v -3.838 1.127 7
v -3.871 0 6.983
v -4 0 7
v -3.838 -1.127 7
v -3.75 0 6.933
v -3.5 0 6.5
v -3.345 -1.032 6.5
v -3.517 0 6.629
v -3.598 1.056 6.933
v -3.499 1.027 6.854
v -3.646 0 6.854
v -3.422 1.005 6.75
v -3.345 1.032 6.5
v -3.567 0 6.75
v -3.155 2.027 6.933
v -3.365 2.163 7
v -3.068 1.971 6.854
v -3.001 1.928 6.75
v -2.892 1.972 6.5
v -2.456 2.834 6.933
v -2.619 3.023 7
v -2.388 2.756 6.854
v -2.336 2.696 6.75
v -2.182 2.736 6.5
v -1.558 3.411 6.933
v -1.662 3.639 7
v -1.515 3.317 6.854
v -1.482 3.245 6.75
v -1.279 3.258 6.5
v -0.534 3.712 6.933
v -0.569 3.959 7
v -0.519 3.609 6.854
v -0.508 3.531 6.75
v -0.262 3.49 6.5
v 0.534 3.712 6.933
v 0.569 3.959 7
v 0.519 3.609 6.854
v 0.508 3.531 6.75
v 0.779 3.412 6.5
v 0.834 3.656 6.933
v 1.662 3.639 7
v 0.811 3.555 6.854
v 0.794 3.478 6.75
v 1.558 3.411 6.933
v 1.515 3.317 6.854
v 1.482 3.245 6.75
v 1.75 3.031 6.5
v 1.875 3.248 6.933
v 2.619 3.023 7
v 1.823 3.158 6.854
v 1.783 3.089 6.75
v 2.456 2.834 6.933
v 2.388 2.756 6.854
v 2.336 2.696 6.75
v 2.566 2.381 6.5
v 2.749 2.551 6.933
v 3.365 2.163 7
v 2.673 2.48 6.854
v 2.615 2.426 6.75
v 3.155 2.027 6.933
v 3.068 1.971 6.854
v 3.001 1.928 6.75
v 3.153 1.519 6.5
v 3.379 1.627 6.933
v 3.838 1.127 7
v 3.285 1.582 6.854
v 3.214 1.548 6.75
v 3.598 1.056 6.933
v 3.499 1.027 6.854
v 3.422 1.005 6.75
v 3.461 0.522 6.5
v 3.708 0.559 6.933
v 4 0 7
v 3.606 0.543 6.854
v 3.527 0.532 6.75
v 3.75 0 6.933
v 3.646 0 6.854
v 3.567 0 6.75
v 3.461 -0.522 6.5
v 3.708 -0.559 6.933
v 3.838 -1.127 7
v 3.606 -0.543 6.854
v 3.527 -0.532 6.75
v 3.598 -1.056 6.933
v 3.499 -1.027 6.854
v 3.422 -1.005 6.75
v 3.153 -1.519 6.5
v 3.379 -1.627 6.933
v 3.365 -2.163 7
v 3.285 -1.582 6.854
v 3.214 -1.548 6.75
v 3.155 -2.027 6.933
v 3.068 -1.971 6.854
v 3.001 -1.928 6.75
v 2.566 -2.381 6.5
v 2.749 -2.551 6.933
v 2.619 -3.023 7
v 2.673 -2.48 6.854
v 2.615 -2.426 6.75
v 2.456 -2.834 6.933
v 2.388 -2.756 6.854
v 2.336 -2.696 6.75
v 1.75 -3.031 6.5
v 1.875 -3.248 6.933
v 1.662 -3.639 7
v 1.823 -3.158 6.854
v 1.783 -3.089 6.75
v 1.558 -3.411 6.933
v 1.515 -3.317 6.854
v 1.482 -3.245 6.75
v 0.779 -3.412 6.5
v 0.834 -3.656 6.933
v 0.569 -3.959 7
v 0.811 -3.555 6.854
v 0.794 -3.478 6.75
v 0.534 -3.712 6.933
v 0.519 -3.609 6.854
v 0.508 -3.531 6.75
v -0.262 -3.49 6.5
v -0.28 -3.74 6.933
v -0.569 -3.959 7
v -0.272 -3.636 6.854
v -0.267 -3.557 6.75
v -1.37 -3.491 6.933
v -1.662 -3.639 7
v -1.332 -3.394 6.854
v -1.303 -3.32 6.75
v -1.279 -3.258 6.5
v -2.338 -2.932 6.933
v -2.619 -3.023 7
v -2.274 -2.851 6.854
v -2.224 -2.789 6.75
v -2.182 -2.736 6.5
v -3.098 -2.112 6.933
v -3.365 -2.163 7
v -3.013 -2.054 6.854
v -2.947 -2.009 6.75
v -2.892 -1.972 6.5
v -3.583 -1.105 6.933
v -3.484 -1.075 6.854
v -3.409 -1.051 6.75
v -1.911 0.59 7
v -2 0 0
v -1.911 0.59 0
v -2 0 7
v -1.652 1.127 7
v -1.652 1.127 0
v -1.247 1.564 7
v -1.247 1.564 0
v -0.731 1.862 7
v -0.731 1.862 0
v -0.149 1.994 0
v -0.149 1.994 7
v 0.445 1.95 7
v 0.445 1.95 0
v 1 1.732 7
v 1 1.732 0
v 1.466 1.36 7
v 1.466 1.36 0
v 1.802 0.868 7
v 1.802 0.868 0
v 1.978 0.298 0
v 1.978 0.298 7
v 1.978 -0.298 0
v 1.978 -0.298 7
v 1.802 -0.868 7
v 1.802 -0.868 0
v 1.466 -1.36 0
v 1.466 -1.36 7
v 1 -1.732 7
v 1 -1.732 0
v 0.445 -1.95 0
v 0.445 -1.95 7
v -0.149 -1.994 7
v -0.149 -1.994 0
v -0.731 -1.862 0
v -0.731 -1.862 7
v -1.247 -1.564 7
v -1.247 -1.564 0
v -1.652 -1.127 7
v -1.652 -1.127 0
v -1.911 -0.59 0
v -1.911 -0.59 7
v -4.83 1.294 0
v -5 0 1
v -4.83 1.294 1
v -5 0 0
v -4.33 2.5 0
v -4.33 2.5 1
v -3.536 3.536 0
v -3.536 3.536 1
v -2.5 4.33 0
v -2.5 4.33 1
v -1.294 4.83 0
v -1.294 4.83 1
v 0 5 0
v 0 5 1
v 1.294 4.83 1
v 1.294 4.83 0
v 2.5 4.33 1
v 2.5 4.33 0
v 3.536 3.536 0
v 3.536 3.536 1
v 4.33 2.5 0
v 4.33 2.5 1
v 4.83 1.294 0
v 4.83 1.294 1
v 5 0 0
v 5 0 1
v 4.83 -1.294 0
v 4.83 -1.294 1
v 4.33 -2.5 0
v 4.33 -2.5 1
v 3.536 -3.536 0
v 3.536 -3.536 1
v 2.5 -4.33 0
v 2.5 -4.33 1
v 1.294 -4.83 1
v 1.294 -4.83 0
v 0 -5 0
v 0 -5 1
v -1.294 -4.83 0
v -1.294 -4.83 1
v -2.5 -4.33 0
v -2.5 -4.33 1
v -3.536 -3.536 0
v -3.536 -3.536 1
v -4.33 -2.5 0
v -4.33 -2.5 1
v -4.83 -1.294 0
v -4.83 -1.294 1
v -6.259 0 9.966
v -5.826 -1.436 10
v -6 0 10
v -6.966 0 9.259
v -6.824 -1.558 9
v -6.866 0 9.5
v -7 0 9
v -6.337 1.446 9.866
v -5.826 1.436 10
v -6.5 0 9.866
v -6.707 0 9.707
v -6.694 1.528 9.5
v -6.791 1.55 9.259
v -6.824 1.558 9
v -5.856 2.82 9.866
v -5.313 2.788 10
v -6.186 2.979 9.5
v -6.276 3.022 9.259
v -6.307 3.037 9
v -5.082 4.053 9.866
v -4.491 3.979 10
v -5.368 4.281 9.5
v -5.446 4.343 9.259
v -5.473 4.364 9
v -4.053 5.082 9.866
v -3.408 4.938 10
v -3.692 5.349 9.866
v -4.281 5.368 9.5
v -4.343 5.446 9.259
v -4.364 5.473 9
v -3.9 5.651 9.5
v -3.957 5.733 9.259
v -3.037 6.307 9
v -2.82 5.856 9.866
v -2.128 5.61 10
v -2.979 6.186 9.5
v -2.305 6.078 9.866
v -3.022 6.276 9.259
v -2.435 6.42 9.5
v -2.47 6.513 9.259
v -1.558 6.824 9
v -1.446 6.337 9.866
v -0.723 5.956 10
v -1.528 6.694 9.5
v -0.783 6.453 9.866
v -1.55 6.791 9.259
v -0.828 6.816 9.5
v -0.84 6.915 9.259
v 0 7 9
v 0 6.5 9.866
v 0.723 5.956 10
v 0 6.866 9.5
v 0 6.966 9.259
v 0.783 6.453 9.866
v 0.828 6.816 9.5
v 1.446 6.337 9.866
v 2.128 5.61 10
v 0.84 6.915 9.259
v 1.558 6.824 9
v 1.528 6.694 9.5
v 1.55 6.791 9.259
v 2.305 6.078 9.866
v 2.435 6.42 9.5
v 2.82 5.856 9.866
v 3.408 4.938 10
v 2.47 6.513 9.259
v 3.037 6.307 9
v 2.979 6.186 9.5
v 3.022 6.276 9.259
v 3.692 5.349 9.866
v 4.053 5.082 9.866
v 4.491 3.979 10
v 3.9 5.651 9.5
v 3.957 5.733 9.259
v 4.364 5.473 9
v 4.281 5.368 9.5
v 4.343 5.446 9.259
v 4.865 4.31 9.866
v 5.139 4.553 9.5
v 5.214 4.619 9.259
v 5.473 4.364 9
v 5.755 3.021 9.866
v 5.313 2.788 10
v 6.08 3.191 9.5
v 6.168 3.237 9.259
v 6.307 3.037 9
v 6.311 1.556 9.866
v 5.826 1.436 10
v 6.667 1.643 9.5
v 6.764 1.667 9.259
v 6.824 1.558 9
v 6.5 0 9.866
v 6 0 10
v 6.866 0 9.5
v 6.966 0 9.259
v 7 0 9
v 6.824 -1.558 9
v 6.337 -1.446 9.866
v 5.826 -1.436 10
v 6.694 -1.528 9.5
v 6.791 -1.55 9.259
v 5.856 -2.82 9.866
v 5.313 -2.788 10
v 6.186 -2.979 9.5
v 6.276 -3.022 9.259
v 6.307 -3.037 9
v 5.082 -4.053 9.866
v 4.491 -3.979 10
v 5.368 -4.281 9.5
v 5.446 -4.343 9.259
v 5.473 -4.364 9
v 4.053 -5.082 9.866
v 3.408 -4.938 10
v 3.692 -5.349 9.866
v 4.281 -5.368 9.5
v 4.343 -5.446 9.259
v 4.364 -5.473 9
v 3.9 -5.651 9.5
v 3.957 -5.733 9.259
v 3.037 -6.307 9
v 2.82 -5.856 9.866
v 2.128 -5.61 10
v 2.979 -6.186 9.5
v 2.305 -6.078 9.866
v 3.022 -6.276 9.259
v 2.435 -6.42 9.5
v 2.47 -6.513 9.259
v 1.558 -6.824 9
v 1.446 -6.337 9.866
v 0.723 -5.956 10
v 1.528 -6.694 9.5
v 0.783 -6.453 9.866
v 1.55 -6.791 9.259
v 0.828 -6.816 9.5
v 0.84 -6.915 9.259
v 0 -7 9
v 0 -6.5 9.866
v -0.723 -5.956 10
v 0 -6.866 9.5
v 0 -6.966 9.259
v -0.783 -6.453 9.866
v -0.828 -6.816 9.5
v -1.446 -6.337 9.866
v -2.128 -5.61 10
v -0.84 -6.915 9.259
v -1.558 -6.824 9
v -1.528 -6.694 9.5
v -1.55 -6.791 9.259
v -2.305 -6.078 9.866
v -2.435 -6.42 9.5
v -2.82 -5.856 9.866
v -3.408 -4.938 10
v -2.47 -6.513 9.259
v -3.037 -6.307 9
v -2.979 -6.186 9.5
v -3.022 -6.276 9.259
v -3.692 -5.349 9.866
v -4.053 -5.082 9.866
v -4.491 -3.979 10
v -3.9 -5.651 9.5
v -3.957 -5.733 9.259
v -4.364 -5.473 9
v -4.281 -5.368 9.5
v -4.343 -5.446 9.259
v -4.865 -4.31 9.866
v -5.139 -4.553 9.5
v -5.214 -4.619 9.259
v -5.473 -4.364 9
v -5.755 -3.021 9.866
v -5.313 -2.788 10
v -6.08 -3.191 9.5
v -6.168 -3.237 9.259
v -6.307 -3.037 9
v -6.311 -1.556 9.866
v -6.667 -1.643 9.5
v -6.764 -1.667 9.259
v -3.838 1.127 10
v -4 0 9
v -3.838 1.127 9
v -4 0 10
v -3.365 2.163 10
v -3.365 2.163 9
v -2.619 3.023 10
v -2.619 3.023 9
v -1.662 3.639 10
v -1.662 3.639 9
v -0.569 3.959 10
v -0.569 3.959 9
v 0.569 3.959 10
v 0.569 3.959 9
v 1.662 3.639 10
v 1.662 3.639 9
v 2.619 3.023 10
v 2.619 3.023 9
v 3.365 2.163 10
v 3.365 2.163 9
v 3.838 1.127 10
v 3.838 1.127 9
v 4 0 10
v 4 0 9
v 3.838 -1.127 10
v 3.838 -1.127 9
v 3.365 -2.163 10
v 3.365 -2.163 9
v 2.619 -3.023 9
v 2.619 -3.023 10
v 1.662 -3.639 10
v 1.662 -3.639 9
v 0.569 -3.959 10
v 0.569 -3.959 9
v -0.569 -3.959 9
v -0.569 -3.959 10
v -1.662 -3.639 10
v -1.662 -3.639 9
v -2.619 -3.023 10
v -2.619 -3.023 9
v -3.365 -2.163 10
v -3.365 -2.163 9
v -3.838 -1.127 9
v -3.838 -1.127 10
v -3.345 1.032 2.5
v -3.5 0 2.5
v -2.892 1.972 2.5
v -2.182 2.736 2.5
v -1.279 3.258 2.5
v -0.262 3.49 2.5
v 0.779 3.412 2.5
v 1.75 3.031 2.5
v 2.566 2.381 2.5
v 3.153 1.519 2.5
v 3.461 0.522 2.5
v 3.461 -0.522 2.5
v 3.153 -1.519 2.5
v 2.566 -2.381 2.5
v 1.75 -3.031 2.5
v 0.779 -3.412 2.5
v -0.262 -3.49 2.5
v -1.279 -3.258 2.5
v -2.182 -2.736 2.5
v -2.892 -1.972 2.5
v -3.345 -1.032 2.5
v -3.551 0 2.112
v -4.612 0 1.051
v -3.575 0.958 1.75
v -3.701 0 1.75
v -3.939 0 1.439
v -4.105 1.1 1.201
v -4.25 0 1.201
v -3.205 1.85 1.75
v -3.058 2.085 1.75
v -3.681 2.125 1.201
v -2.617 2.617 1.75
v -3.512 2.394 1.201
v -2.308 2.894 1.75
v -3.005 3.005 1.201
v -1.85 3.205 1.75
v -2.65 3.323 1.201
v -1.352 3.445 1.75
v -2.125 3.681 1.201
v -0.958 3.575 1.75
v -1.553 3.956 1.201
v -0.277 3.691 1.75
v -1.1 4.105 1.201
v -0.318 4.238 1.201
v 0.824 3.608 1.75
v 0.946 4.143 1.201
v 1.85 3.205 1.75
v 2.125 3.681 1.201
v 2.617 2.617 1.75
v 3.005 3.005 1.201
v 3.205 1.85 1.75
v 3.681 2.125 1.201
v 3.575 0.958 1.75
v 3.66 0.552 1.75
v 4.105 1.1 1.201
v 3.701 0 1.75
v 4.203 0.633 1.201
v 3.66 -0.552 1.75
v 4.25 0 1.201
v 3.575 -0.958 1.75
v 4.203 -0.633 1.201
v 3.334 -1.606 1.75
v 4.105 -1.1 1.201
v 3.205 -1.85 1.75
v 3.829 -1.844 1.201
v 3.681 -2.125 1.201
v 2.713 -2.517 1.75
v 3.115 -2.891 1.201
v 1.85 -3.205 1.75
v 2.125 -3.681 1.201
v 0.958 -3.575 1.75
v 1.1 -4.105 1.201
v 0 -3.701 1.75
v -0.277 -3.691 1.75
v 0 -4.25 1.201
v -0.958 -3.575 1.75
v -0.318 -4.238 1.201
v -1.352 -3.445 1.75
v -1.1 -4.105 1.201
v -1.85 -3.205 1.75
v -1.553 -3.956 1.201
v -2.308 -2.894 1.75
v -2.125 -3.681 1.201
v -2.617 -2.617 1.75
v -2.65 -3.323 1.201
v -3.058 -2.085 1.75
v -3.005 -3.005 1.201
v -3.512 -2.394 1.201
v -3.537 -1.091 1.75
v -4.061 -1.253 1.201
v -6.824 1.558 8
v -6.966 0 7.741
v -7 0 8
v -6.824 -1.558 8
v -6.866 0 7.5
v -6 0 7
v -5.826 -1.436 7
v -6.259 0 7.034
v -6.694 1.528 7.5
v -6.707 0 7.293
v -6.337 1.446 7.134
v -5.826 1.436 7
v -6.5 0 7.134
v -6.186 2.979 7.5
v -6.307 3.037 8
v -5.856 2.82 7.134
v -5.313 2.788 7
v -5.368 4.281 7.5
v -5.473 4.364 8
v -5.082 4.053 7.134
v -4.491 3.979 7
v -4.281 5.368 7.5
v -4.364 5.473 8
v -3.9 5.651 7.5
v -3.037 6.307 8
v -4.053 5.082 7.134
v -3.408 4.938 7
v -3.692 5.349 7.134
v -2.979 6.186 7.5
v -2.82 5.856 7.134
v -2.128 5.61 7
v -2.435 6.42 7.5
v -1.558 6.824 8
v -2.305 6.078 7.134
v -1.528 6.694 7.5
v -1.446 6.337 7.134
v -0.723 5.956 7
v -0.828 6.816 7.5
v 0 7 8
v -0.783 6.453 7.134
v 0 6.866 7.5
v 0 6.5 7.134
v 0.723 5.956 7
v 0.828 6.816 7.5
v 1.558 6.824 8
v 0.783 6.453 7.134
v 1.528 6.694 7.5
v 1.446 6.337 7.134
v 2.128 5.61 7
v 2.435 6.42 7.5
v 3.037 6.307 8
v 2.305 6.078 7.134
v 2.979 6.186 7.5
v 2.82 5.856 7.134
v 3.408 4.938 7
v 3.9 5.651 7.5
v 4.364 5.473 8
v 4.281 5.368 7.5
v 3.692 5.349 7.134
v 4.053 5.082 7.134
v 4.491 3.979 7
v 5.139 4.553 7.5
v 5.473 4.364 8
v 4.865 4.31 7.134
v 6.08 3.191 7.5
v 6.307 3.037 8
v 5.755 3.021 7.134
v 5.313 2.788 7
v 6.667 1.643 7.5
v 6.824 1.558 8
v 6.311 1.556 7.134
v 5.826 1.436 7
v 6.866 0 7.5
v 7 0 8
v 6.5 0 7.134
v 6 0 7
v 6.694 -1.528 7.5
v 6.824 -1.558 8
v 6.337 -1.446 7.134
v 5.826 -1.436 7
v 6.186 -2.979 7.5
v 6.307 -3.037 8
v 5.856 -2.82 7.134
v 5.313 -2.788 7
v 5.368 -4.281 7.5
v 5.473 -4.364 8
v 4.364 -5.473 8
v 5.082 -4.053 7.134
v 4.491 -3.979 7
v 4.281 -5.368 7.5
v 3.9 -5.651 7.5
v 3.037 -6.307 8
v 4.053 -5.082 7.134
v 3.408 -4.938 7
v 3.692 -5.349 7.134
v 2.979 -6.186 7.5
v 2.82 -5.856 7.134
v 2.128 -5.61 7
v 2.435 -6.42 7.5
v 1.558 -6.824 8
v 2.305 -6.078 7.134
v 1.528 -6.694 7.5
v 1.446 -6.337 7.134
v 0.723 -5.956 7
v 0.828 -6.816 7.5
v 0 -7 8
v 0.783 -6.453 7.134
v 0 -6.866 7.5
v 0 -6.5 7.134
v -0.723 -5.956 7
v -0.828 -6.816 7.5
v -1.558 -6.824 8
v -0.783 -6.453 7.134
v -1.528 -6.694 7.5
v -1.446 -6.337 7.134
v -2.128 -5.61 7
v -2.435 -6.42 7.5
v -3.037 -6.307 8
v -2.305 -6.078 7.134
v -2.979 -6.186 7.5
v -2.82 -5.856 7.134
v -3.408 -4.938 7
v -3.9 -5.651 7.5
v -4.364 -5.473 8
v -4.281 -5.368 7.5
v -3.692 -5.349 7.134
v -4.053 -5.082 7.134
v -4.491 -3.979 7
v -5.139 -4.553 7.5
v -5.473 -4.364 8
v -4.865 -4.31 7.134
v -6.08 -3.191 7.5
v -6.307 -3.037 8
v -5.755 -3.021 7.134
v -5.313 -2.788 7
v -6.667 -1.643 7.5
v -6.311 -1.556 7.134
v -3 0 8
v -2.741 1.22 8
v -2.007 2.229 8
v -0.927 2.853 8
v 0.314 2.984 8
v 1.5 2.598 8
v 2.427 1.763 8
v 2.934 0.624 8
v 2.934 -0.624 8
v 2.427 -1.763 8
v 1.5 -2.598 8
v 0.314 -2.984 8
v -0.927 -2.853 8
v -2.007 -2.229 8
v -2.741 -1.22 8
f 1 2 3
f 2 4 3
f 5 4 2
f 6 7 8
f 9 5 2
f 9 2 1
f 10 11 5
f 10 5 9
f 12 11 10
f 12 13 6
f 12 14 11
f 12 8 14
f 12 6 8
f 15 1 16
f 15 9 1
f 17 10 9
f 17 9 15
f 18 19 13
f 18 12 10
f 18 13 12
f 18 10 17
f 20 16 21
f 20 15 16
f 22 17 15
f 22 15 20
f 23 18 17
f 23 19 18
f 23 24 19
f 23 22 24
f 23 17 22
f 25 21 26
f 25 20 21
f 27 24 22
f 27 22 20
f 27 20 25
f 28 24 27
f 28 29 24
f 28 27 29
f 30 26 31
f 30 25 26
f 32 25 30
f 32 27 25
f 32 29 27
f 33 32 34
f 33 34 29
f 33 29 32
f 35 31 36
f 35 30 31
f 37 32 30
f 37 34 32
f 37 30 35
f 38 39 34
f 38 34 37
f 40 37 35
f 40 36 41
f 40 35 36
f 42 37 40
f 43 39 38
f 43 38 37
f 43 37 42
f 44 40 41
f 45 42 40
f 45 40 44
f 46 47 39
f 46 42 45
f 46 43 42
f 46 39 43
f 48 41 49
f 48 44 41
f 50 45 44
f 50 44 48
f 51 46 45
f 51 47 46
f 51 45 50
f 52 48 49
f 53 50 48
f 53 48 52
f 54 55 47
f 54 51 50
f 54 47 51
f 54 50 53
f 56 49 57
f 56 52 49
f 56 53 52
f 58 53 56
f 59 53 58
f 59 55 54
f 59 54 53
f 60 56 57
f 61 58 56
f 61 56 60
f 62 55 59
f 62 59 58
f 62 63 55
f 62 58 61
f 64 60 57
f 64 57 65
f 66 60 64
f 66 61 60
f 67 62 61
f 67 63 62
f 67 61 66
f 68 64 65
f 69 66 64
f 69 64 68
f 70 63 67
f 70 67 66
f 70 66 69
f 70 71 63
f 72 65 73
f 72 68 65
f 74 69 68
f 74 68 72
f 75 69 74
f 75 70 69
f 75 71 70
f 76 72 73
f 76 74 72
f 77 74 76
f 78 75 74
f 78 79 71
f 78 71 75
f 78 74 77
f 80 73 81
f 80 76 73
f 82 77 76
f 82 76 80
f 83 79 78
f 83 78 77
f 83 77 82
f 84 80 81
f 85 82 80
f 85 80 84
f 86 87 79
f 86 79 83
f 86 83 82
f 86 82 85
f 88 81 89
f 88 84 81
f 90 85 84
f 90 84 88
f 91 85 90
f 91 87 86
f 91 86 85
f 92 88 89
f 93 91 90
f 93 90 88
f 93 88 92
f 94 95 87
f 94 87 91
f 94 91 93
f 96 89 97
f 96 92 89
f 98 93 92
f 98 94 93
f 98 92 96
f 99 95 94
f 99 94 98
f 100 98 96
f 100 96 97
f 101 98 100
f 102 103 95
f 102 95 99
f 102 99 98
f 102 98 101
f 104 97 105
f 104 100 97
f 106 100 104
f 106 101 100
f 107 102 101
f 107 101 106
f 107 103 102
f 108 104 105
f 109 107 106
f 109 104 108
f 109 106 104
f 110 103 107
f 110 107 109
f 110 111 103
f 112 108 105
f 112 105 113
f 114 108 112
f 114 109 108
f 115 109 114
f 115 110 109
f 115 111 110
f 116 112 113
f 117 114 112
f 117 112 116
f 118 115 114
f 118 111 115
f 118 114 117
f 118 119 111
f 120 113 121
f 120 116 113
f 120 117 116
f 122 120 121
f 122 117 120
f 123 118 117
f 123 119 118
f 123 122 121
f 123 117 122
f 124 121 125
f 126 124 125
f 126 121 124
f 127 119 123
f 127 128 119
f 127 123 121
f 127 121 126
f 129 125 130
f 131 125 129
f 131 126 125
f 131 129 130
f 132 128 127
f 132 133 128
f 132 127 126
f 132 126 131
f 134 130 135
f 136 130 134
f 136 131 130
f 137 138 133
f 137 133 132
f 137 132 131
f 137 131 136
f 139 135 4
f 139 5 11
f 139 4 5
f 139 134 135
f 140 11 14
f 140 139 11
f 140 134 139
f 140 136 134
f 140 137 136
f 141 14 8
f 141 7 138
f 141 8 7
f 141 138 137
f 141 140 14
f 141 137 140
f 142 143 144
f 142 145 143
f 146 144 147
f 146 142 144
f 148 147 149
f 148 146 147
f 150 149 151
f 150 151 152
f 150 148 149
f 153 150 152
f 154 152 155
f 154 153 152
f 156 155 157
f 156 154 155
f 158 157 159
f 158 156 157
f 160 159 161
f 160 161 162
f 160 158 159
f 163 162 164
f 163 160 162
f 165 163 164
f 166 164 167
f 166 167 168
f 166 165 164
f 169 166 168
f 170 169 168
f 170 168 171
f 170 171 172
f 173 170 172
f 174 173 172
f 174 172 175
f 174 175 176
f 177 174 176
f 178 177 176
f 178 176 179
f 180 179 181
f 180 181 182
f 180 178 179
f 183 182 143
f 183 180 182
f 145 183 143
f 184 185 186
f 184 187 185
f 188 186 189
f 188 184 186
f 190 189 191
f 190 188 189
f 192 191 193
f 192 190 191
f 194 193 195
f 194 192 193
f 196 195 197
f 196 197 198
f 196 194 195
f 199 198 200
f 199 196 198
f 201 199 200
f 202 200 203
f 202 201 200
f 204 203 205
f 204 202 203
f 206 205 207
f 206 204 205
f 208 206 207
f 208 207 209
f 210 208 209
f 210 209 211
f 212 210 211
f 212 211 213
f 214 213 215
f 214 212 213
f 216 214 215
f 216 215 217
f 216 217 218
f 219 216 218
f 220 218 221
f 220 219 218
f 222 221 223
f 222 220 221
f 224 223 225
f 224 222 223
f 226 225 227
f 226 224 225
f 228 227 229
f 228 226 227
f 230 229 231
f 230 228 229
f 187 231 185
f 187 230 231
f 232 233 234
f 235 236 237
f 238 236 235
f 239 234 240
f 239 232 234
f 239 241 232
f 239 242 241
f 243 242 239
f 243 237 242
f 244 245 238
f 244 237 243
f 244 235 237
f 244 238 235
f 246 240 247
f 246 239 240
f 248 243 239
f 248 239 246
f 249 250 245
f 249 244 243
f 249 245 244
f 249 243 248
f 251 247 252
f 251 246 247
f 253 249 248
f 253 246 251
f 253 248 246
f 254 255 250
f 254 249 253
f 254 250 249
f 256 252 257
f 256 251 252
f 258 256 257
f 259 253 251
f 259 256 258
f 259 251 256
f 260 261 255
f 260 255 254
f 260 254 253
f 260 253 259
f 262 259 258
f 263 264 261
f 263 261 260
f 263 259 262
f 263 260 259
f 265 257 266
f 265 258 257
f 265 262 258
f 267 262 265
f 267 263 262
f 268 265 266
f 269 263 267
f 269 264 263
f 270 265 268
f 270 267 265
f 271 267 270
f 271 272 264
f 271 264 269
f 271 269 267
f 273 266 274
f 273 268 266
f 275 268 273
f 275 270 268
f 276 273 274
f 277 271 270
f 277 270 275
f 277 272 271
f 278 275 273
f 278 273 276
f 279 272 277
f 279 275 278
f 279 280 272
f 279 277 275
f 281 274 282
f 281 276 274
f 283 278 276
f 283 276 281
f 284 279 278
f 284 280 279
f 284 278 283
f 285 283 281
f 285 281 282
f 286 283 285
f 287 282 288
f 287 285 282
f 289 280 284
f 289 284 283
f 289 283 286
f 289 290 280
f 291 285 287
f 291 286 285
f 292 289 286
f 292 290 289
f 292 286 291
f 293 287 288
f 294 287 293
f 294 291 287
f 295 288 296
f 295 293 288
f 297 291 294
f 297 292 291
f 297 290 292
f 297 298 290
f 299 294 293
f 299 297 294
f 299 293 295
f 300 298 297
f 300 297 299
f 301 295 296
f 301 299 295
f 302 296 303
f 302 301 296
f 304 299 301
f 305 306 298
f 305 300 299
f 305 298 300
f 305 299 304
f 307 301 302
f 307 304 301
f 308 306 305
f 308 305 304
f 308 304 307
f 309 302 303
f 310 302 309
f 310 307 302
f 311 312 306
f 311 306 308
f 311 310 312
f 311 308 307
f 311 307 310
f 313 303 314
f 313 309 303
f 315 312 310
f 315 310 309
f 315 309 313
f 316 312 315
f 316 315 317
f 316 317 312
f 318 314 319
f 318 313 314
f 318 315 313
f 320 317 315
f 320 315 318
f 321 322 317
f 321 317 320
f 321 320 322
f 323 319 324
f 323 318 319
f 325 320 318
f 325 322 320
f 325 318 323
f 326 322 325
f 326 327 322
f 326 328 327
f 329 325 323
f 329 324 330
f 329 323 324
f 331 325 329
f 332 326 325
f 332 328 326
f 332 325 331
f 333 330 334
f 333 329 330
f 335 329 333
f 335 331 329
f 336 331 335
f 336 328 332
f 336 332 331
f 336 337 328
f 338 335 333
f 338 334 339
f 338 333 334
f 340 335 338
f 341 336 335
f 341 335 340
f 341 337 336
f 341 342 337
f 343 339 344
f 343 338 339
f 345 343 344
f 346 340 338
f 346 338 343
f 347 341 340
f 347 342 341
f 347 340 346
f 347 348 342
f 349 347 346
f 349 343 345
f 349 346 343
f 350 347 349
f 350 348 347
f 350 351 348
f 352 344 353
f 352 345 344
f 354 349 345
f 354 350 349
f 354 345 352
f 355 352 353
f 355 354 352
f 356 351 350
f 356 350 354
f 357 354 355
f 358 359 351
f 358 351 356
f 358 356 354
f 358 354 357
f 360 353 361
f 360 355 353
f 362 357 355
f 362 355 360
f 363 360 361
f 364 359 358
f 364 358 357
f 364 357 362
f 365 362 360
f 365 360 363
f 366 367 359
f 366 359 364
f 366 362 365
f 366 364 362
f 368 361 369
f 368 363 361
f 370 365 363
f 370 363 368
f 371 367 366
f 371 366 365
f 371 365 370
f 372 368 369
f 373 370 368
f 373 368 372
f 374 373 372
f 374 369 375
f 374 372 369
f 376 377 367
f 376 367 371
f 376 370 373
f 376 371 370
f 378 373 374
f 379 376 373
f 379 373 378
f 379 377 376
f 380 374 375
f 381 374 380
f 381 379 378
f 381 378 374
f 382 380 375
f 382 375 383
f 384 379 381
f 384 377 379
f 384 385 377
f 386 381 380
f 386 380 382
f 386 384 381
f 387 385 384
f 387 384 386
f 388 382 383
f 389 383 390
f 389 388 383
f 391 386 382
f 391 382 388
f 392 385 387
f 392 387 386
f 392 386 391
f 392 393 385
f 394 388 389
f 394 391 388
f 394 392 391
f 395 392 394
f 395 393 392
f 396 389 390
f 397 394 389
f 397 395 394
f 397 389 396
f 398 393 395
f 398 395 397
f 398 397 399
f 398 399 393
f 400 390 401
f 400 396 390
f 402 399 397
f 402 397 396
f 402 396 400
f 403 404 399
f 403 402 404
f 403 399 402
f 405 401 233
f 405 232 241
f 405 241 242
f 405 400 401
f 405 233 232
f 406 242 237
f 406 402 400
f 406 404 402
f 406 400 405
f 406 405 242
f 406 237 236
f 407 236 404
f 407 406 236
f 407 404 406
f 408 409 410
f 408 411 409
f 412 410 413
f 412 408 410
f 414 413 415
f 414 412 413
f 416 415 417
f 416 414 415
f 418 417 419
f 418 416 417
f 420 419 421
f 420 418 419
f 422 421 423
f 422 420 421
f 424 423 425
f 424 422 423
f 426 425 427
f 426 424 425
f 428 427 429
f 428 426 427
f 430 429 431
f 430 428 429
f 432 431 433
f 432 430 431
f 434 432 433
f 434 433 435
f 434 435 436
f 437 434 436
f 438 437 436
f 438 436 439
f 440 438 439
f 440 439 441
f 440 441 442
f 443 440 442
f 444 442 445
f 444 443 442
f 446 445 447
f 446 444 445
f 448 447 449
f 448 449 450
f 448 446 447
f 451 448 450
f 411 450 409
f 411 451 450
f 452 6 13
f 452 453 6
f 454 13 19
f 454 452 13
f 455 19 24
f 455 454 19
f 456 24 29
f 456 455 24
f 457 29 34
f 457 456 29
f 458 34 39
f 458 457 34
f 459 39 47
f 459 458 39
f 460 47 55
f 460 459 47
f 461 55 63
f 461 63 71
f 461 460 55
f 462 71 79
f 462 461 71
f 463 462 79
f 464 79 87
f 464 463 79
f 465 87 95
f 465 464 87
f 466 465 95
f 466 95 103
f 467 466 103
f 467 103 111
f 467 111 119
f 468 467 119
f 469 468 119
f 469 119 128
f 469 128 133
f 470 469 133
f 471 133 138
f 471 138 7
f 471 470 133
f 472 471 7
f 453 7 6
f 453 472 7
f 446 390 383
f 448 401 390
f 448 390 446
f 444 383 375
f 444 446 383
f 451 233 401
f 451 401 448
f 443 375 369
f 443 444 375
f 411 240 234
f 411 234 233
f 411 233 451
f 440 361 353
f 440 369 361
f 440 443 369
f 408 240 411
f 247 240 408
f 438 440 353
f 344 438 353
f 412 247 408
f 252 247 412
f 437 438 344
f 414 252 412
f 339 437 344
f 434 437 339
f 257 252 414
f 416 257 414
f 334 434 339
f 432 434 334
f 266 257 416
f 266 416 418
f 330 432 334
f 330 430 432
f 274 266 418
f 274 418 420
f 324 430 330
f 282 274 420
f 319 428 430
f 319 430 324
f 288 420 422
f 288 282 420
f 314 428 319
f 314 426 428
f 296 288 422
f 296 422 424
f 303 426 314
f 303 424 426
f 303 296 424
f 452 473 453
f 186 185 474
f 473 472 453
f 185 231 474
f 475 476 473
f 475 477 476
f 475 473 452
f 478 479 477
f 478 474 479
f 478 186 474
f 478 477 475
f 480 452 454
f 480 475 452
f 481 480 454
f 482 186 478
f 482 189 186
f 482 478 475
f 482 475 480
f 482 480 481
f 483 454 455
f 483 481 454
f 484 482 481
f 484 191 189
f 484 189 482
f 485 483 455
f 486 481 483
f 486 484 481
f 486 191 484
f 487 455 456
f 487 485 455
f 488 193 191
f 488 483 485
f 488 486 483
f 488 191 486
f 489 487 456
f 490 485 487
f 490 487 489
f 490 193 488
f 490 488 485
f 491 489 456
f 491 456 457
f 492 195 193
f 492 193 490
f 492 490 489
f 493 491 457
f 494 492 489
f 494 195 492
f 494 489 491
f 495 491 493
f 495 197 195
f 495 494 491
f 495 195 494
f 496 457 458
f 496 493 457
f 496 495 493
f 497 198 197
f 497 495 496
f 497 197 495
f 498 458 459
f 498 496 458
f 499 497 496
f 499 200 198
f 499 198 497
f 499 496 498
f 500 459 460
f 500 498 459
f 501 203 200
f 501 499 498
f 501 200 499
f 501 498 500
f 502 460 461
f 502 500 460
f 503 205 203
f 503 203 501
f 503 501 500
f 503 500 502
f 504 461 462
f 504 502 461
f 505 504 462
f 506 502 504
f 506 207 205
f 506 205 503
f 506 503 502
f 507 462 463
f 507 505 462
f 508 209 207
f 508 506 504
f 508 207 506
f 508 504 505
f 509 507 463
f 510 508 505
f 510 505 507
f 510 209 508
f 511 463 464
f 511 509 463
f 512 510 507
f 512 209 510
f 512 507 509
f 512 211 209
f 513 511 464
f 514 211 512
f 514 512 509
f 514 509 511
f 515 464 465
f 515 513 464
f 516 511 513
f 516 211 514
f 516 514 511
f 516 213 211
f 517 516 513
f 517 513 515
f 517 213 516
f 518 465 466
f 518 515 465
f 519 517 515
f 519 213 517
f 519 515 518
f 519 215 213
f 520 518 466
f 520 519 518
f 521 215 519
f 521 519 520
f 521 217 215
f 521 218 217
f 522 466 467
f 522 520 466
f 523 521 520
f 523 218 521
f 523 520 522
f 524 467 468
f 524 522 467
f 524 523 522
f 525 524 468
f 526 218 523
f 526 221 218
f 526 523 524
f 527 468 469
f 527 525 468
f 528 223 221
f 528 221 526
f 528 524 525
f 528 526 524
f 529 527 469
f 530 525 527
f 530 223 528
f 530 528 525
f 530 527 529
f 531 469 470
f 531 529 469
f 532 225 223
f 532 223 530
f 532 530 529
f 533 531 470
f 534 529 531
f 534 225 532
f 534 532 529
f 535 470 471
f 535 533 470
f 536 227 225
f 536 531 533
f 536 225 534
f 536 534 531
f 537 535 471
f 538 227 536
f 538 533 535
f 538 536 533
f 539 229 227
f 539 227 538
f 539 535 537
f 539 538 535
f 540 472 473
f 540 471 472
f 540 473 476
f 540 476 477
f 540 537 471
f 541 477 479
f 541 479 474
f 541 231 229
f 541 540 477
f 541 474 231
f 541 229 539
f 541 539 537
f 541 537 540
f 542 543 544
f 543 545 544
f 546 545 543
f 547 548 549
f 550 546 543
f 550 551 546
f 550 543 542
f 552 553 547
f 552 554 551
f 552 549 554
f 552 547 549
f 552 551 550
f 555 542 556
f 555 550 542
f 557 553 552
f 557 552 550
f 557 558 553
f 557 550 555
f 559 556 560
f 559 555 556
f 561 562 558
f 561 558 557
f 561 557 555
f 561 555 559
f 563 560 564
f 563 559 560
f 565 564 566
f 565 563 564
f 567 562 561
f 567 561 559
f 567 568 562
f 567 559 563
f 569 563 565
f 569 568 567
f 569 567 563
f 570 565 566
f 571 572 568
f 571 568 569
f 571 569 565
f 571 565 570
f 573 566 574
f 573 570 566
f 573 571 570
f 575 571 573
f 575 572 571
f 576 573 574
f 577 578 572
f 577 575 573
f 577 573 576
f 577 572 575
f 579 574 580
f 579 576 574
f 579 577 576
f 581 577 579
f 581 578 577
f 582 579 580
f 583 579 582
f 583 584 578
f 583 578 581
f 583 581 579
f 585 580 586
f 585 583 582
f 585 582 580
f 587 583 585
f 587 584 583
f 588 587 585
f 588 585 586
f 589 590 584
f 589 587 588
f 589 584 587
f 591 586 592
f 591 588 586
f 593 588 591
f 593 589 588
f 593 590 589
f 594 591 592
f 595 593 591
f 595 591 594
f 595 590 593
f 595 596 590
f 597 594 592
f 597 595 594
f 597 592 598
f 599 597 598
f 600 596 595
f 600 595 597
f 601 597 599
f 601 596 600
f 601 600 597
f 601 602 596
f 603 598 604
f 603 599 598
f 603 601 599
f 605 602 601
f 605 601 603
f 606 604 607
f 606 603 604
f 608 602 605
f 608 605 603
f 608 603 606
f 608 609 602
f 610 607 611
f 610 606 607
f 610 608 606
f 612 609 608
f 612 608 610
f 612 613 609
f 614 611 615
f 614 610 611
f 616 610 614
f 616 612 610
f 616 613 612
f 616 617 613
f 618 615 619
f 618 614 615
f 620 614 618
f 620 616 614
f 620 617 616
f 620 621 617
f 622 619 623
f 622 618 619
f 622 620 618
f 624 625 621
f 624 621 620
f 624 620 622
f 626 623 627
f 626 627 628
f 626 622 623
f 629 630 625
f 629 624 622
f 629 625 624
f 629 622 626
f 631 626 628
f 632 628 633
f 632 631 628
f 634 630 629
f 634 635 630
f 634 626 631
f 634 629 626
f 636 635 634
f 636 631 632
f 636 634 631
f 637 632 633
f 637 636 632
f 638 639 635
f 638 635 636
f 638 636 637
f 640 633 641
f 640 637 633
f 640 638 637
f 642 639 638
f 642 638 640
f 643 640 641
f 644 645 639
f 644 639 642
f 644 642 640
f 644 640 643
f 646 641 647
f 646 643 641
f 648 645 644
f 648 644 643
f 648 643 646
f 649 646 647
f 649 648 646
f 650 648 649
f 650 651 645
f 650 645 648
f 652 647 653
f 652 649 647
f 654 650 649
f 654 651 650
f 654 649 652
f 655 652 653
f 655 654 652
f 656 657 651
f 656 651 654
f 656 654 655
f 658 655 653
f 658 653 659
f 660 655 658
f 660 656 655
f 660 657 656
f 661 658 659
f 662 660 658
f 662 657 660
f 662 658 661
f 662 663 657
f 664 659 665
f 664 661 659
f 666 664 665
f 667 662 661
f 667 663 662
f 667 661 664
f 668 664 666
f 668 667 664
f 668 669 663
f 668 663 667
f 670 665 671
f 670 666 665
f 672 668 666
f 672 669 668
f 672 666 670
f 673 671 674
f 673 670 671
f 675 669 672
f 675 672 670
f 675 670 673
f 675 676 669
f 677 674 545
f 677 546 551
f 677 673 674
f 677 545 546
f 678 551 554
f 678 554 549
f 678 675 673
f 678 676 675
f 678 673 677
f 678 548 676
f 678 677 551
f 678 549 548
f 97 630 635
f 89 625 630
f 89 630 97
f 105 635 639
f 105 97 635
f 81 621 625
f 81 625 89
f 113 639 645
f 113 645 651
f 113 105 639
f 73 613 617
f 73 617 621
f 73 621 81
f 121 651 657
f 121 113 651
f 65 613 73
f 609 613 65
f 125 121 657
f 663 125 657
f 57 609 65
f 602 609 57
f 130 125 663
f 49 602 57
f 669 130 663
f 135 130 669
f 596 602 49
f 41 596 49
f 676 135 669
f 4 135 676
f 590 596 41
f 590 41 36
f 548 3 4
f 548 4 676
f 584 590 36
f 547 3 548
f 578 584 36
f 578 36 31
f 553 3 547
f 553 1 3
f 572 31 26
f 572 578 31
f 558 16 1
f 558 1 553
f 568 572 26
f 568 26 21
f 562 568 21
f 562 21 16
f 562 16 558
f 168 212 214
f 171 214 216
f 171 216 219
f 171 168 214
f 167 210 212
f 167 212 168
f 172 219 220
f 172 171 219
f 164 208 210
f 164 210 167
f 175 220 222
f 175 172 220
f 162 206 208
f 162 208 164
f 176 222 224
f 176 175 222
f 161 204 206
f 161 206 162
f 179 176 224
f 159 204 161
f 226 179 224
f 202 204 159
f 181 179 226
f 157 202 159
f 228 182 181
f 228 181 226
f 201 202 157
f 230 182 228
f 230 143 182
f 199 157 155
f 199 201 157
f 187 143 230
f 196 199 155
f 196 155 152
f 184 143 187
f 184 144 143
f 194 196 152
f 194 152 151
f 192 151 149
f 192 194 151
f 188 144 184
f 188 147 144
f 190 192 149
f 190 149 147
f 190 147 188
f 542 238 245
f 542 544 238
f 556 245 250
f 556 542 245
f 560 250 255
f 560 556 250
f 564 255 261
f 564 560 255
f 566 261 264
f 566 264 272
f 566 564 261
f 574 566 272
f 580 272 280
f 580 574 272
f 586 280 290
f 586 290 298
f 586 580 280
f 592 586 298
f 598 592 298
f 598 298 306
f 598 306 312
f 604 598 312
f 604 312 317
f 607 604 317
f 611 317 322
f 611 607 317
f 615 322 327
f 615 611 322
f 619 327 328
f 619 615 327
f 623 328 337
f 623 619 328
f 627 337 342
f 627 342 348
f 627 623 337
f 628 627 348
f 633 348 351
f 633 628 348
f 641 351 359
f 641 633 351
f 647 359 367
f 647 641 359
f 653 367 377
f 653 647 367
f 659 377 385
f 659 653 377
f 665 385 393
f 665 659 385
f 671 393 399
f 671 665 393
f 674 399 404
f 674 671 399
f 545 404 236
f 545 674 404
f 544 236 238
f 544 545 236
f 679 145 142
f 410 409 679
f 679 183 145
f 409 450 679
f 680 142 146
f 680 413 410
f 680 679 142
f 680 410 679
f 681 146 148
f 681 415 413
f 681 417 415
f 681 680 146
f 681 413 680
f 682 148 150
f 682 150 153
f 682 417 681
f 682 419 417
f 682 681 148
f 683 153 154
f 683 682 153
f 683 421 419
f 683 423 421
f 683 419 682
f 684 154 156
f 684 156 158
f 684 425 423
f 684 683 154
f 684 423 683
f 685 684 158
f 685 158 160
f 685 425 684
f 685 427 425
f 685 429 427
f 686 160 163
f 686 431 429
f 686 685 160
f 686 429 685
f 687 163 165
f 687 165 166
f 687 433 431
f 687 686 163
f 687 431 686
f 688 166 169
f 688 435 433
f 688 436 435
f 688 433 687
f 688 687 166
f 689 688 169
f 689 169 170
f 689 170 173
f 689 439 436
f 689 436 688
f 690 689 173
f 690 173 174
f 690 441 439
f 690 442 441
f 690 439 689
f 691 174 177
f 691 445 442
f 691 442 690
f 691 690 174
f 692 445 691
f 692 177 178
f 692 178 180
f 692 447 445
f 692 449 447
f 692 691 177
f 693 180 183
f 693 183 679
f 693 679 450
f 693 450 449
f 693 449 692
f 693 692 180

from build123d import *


with BuildPart() as f1:
    # F0 (on Front) → F1 (revolve)
    with BuildSketch(Plane.XZ):
        with BuildLine():
            Line((-5, 0), (-2, 0))
            Line((-2, 0), (-2, 7))
            Line((-2, 7), (-4, 9))
            Line((-4, 9), (-4, 10))
            Line((-4, 10), (-6, 10))
            ThreePointArc((-6, 10), (-6.707107, 9.707107), (-7, 9))
            Line((-7, 9), (-7, 8))
            ThreePointArc((-7, 8), (-6.707107, 7.292893), (-6, 7))
            Line((-6, 7), (-4, 7))
            ThreePointArc((-4, 7), (-3.646447, 6.853553), (-3.5, 6.5))
            Line((-3.5, 6.5), (-3.5, 2.5))
            ThreePointArc((-3.5, 2.5), (-3.93934, 1.43934), (-5, 1))
            Line((-5, 1), (-5, 0))
        make_face()
    revolve(axis=Axis((0, 0, -0.231959), (0, 0, -1)))


solid = f1.part
